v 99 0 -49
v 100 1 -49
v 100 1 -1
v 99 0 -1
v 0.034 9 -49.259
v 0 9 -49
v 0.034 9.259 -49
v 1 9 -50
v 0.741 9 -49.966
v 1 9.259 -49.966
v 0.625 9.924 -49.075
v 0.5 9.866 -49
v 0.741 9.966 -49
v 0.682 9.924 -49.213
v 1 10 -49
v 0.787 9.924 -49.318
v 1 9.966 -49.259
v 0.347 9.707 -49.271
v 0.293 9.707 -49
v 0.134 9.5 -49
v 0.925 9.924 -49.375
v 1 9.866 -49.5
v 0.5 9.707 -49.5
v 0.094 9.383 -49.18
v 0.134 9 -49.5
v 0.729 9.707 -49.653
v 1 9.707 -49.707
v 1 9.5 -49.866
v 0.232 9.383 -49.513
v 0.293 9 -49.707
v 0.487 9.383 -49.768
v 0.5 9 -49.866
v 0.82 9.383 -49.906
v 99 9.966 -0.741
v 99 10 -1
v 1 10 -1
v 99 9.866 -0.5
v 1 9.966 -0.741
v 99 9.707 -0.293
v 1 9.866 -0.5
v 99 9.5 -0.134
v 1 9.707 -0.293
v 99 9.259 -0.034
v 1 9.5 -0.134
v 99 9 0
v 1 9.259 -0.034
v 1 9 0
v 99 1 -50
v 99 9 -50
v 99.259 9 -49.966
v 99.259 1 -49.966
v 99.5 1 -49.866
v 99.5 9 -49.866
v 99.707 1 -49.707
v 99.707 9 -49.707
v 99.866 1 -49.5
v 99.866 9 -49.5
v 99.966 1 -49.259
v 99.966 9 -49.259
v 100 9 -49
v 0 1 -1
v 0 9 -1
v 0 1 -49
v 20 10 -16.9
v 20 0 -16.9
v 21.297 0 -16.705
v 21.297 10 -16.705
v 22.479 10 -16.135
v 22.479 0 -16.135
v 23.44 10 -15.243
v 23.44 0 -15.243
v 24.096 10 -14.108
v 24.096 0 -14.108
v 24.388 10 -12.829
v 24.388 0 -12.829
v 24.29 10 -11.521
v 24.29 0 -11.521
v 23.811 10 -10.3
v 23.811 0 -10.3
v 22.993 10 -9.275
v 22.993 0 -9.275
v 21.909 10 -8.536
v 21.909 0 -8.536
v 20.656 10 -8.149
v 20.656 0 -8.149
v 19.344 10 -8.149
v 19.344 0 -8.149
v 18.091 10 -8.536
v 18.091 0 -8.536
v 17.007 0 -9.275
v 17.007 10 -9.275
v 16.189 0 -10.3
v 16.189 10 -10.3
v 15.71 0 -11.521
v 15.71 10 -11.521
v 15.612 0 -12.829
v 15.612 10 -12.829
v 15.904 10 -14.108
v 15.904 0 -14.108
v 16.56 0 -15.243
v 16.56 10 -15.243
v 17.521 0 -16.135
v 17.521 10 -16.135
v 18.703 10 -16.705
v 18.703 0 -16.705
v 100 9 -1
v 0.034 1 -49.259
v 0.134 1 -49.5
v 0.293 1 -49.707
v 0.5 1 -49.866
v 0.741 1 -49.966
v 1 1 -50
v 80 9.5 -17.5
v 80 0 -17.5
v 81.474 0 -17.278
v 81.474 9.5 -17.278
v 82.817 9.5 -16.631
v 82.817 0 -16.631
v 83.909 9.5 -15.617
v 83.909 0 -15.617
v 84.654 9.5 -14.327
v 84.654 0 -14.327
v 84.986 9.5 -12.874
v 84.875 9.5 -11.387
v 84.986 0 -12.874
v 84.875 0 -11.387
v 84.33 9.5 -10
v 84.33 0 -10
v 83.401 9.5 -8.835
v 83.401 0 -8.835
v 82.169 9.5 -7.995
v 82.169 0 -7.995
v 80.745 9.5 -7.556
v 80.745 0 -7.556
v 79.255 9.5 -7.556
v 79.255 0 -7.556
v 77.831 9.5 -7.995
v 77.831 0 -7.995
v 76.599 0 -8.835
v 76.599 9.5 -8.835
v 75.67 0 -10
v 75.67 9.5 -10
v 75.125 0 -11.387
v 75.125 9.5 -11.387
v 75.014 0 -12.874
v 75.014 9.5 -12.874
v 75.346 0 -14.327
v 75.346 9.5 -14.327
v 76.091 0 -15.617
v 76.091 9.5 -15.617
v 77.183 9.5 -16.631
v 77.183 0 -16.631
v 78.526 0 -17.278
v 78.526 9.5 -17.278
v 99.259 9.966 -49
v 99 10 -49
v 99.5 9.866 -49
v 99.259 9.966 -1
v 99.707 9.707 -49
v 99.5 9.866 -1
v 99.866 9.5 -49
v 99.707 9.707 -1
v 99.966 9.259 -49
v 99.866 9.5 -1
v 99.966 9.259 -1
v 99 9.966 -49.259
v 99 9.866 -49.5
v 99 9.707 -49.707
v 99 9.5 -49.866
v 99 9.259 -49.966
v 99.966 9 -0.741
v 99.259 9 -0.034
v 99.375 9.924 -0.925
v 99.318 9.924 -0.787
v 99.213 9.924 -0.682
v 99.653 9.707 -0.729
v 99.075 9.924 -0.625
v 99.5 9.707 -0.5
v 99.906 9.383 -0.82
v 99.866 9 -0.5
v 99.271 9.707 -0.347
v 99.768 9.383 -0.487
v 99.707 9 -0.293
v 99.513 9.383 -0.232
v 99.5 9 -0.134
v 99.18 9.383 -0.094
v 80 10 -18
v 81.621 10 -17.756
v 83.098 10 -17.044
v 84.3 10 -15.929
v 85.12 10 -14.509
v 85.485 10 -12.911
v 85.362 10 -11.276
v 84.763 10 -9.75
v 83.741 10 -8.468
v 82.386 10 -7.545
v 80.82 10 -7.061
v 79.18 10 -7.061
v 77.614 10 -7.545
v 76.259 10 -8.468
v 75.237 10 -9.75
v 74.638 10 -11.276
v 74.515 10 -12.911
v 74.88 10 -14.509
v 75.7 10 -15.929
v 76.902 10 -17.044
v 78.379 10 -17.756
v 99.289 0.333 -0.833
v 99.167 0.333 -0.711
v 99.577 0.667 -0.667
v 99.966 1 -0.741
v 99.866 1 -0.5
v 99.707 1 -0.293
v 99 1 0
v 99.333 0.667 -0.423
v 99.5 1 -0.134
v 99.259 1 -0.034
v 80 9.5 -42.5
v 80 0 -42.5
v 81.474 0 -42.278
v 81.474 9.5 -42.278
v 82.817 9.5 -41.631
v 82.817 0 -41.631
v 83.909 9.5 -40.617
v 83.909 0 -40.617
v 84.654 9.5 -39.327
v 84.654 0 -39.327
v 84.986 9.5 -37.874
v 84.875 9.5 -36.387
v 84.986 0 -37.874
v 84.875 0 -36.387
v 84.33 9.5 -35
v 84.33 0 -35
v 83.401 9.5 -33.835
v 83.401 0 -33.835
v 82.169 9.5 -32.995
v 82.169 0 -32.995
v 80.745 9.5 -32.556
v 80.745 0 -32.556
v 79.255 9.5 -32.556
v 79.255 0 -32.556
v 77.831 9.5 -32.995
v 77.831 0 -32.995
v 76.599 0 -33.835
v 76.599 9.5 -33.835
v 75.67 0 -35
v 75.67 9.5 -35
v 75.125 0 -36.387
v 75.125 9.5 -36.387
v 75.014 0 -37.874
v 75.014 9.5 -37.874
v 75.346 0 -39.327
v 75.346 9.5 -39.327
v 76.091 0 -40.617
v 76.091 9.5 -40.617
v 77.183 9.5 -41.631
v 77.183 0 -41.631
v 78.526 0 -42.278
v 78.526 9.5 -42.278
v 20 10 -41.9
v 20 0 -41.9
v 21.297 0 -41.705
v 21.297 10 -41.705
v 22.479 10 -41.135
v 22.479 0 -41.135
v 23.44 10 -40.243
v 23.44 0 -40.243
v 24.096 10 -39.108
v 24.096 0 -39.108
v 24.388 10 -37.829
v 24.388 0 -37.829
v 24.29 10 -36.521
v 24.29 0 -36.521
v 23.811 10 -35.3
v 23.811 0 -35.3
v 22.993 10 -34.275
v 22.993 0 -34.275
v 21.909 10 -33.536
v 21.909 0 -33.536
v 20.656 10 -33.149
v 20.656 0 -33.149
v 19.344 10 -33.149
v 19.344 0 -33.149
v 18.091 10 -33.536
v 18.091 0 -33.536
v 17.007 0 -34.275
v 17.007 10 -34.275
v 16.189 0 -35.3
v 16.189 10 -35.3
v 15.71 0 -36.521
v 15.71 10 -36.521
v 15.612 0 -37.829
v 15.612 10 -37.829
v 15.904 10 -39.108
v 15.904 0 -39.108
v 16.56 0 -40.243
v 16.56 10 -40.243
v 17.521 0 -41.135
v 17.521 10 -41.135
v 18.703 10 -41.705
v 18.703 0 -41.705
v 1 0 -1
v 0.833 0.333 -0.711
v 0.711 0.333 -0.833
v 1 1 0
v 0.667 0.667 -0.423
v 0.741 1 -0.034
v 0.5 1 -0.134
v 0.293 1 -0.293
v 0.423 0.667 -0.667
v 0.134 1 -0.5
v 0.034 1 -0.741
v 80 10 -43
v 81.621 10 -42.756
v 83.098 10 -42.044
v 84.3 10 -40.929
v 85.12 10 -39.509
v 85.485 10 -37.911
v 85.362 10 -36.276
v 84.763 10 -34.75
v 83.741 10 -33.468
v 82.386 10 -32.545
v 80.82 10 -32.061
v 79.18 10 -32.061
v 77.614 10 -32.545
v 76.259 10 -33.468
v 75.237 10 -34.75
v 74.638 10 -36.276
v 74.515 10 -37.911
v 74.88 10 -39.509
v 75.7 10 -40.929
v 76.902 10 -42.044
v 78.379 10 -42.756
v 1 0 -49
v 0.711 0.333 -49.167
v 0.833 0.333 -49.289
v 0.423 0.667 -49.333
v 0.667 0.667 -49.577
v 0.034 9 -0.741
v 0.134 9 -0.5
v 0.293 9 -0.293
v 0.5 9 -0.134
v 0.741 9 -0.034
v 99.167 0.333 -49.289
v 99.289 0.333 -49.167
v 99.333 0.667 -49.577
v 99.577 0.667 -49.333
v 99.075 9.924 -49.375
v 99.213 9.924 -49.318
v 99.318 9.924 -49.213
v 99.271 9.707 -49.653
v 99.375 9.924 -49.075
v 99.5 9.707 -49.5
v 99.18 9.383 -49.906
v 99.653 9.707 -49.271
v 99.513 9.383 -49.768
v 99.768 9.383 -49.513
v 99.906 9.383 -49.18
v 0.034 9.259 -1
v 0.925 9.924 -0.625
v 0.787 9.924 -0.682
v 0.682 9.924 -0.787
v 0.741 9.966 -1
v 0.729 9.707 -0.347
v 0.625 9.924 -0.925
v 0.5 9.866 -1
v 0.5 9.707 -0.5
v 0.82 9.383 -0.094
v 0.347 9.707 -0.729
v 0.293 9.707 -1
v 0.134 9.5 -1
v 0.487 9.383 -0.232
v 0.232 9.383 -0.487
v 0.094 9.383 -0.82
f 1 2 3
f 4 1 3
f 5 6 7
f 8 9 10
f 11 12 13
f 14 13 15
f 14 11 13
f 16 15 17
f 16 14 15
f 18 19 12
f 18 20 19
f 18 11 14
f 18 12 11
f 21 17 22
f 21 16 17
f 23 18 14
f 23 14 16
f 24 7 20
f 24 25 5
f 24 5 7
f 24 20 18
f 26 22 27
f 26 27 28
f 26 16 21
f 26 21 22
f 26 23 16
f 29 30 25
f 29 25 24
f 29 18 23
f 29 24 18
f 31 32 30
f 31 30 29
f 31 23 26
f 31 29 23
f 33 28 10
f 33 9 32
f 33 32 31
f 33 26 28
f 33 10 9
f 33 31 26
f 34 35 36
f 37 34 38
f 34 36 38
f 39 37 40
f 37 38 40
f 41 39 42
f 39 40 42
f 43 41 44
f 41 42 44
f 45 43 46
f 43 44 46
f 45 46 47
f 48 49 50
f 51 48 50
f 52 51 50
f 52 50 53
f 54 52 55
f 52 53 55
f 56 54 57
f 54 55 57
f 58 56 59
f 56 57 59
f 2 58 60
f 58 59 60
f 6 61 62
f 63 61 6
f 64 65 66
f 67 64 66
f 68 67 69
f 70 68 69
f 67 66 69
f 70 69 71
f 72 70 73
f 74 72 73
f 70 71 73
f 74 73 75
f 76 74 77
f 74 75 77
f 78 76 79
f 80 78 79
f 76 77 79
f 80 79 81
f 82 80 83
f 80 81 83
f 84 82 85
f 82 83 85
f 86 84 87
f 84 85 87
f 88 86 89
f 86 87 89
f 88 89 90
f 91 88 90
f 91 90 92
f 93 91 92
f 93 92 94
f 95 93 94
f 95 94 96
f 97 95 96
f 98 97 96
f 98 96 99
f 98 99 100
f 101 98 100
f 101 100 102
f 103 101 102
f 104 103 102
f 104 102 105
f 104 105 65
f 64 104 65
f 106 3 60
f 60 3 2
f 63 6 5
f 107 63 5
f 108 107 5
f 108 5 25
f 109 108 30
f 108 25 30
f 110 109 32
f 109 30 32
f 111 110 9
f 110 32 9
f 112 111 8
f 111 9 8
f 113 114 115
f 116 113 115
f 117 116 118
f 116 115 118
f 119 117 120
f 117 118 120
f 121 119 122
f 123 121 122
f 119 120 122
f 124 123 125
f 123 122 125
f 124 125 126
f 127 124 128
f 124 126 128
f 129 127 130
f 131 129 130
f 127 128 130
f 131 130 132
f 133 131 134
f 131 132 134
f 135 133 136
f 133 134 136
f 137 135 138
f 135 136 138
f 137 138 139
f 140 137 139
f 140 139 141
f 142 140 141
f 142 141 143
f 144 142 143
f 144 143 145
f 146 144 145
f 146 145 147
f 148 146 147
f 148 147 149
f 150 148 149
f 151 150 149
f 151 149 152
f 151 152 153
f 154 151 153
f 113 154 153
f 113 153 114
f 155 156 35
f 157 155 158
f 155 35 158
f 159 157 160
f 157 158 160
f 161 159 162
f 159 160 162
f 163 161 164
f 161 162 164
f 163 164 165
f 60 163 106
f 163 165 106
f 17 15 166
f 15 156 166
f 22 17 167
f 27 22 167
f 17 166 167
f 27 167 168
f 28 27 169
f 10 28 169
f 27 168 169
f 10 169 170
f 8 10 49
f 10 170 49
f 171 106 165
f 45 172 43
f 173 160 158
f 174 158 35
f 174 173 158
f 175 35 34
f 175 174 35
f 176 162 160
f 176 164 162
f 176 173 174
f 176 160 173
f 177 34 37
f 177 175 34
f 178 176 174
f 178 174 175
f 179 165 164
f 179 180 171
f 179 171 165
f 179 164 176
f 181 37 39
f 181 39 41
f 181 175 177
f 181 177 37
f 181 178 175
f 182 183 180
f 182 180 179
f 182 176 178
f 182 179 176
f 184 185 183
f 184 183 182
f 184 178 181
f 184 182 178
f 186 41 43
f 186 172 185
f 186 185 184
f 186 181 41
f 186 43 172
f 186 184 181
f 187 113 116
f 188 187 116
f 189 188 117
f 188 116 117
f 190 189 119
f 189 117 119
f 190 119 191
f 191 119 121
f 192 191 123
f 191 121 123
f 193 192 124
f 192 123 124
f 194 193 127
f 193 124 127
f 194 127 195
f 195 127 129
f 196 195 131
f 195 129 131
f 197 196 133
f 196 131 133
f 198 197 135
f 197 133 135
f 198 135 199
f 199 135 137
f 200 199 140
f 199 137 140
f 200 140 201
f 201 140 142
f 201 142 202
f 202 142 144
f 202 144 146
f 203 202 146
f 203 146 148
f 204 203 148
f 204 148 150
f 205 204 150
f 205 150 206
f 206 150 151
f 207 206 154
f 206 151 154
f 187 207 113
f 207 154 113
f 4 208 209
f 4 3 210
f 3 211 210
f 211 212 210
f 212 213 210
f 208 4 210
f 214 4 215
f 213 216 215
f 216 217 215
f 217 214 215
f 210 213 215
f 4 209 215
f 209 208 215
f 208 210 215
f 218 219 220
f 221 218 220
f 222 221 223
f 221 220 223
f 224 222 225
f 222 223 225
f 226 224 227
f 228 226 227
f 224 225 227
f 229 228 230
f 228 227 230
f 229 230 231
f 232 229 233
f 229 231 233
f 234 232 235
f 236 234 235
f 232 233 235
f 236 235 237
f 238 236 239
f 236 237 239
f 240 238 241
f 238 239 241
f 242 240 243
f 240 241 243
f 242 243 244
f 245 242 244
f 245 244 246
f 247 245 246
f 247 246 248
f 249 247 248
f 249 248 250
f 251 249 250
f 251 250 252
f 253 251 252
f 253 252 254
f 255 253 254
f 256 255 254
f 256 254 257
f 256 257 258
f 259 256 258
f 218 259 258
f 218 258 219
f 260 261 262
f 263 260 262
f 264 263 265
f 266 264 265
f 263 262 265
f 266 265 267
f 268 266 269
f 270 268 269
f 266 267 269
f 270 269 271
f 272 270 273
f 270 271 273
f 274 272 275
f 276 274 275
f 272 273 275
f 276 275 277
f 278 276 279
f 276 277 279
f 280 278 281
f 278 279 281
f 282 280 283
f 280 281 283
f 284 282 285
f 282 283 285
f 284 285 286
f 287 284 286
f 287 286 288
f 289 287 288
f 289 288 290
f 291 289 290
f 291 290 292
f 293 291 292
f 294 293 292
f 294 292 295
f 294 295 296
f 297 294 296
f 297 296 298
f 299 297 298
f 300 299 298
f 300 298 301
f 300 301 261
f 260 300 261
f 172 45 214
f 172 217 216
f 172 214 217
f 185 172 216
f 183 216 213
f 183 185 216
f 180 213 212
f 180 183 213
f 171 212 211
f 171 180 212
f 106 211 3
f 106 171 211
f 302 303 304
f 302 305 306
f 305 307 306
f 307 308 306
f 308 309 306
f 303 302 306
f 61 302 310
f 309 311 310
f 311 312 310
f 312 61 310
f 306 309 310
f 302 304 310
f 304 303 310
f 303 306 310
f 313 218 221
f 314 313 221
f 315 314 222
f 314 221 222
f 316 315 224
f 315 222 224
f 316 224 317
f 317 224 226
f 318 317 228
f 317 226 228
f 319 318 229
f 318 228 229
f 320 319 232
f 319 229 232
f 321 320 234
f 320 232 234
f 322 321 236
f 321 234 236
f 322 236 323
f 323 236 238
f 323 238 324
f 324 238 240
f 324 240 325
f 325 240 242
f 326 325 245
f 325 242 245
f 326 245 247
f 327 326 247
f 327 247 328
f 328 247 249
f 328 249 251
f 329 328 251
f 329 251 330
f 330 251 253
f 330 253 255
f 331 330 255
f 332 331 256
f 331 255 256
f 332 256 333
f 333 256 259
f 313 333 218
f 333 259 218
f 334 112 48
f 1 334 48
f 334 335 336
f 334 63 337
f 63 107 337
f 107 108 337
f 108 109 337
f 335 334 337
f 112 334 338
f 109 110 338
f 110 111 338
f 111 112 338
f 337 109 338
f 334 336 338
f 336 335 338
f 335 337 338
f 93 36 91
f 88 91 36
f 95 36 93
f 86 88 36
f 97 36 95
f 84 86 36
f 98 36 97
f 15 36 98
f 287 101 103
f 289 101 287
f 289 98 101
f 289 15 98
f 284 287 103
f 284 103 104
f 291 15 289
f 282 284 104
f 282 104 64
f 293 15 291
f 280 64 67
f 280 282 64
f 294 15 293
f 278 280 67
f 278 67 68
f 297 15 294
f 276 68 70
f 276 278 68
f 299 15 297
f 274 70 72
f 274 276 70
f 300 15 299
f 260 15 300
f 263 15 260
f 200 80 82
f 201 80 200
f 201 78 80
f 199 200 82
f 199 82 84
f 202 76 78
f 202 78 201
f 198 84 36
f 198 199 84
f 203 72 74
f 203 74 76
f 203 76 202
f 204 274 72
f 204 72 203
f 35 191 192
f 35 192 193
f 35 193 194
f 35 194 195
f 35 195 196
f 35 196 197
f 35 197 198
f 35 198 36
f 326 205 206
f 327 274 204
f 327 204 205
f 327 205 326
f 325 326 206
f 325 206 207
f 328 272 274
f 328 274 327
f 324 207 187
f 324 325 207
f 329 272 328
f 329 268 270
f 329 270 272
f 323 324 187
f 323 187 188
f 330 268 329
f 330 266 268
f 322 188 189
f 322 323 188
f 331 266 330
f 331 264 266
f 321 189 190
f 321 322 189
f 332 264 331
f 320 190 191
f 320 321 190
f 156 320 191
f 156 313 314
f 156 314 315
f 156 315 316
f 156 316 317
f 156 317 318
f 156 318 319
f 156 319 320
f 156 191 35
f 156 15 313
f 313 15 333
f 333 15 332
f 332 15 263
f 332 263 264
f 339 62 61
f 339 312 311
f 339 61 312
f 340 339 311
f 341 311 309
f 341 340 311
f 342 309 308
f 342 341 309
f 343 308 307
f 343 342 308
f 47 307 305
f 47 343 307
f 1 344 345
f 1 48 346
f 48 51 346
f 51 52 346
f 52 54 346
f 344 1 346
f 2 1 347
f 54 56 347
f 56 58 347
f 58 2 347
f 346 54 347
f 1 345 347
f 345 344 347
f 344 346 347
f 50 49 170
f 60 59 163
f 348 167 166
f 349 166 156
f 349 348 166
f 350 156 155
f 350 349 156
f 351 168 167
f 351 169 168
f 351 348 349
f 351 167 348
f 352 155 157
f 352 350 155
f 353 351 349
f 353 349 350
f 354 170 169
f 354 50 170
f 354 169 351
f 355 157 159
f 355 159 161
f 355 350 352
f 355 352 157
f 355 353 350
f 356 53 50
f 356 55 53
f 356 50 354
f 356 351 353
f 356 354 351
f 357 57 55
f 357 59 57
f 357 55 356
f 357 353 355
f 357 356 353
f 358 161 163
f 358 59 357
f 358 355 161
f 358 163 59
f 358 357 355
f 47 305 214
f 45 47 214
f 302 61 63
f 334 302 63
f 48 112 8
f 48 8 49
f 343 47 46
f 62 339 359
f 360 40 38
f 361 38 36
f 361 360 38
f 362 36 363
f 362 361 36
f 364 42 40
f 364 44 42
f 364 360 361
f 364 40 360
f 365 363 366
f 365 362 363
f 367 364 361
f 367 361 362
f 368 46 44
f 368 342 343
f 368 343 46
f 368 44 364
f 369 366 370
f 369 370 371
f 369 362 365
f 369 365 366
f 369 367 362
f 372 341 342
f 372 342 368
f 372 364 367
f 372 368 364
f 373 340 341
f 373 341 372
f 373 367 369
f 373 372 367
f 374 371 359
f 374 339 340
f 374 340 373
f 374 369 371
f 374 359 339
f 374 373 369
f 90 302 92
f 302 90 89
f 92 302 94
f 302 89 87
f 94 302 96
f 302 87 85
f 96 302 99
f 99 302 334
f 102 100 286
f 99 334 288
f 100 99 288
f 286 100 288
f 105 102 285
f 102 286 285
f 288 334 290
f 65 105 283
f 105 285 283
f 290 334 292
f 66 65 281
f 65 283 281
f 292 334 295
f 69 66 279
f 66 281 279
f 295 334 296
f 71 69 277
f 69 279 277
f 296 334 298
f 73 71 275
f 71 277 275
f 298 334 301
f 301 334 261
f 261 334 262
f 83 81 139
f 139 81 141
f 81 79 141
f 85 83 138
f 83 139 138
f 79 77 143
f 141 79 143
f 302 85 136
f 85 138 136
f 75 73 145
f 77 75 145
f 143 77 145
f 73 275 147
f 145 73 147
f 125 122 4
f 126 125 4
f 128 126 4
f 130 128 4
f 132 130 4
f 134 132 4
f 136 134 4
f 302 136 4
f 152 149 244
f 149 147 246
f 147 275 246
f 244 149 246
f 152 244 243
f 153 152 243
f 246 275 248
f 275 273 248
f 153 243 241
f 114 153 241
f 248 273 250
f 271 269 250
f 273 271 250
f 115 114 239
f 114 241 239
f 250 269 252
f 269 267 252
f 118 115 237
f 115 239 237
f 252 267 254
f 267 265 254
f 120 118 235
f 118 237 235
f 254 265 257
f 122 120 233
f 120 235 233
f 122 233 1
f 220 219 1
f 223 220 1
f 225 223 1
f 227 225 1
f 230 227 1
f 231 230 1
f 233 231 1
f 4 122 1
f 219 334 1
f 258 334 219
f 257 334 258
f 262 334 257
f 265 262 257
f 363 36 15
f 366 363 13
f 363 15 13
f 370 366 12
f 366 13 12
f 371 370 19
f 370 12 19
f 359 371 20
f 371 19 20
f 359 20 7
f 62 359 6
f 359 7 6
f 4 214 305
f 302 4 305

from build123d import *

# Parameters (mm, degrees)
SKETCH_1_W       = 100
SKETCH_1_H       = 50
EXTRUDE_1_DEPTH  = 10
F_10_0MM_1_D     = 10
F_10_0MM_1_DEPTH = 23.75
F_10_0MM_1_TIP   = 3.004303095
M10X1_25_1_D     = 8.8
M10X1_25_1_DEPTH = 23.75
M10X1_25_1_TIP   = 2.643786724
FILLET_1_R       = 1
CHAMFER_1_SIZE   = 1
CHAMFER_2_SIZE   = 0.5
FILLET_2_R       = 1


with BuildPart() as part:
    # 草圖1 → 填料-伸長1 (new body)
    with BuildSketch(Plane(origin=(0, 0, 0), x_dir=(1, 0, 0), z_dir=(0, 1, 0))):
        with Locations((50, 25)):
            Rectangle(SKETCH_1_W, SKETCH_1_H)
    extrude(amount=EXTRUDE_1_DEPTH)

    # Ø10.0mm 定位孔1
    with Locations(Plane(origin=(80, 10, -37.5), x_dir=(0, 0, 1), z_dir=(0, 1, 0))):
        with Locations((0, 0), (25, 0)):
            Hole(F_10_0MM_1_D / 2, depth=F_10_0MM_1_DEPTH)
            with Locations((0, 0, -(F_10_0MM_1_DEPTH + F_10_0MM_1_TIP / 2))):  # 118° drill point
                Cone(0, F_10_0MM_1_D / 2, F_10_0MM_1_TIP, mode=Mode.SUBTRACT)

    # M10x1.25 螺紋孔1
    with Locations(Plane(origin=(20, 10, -37.5), x_dir=(0, 0, 1), z_dir=(0, 1, 0))):
        with Locations((0, 0), (25, 0)):
            Hole(M10X1_25_1_D / 2, depth=M10X1_25_1_DEPTH)
            with Locations((0, 0, -(M10X1_25_1_DEPTH + M10X1_25_1_TIP / 2))):  # 118° drill point
                Cone(0, M10X1_25_1_D / 2, M10X1_25_1_TIP, mode=Mode.SUBTRACT)

    # 圓角1
    fillet_1_edges = [part.edges().sort_by_distance(p)[0] for p in [
        (0, 5, -50),
        (100, 5, -50),
        (100, 5, 0),
        (0, 5, 0),
    ]]
    fillet(fillet_1_edges, radius=FILLET_1_R)

    # 導角1
    chamfer_1_edges = [part.edges().sort_by_distance(p)[0] for p in [
        (50, 0, -50),
        (0, 0, -25),
        (100, 0, -25),
        (50, 0, 0),
        (99.707106781, 0, -0.292893219),
        (0.292893219, 0, -0.292893219),
        (0.292893219, 0, -49.707106781),
        (99.707106781, 0, -49.707106781),
    ]]
    chamfer(chamfer_1_edges, length=CHAMFER_1_SIZE)

    # 導角2
    chamfer_2_edges = [part.edges().sort_by_distance(p)[0] for p in [
        (80, 10, -7.5),
        (80, 10, -32.5),
    ]]
    chamfer(chamfer_2_edges, length=CHAMFER_2_SIZE)

    # 圓角2
    fillet_2_edges = [part.edges().sort_by_distance(p)[0] for p in [
        (50, 10, -50),
        (100, 10, -25),
        (0, 10, -25),
        (50, 10, 0),
        (99.707106781, 10, -0.292893219),
        (0.292893219, 10, -0.292893219),
        (0.292893219, 10, -49.707106781),
        (99.707106781, 10, -49.707106781),
    ]]
    fillet(fillet_2_edges, radius=FILLET_2_R)


solid = part.part
